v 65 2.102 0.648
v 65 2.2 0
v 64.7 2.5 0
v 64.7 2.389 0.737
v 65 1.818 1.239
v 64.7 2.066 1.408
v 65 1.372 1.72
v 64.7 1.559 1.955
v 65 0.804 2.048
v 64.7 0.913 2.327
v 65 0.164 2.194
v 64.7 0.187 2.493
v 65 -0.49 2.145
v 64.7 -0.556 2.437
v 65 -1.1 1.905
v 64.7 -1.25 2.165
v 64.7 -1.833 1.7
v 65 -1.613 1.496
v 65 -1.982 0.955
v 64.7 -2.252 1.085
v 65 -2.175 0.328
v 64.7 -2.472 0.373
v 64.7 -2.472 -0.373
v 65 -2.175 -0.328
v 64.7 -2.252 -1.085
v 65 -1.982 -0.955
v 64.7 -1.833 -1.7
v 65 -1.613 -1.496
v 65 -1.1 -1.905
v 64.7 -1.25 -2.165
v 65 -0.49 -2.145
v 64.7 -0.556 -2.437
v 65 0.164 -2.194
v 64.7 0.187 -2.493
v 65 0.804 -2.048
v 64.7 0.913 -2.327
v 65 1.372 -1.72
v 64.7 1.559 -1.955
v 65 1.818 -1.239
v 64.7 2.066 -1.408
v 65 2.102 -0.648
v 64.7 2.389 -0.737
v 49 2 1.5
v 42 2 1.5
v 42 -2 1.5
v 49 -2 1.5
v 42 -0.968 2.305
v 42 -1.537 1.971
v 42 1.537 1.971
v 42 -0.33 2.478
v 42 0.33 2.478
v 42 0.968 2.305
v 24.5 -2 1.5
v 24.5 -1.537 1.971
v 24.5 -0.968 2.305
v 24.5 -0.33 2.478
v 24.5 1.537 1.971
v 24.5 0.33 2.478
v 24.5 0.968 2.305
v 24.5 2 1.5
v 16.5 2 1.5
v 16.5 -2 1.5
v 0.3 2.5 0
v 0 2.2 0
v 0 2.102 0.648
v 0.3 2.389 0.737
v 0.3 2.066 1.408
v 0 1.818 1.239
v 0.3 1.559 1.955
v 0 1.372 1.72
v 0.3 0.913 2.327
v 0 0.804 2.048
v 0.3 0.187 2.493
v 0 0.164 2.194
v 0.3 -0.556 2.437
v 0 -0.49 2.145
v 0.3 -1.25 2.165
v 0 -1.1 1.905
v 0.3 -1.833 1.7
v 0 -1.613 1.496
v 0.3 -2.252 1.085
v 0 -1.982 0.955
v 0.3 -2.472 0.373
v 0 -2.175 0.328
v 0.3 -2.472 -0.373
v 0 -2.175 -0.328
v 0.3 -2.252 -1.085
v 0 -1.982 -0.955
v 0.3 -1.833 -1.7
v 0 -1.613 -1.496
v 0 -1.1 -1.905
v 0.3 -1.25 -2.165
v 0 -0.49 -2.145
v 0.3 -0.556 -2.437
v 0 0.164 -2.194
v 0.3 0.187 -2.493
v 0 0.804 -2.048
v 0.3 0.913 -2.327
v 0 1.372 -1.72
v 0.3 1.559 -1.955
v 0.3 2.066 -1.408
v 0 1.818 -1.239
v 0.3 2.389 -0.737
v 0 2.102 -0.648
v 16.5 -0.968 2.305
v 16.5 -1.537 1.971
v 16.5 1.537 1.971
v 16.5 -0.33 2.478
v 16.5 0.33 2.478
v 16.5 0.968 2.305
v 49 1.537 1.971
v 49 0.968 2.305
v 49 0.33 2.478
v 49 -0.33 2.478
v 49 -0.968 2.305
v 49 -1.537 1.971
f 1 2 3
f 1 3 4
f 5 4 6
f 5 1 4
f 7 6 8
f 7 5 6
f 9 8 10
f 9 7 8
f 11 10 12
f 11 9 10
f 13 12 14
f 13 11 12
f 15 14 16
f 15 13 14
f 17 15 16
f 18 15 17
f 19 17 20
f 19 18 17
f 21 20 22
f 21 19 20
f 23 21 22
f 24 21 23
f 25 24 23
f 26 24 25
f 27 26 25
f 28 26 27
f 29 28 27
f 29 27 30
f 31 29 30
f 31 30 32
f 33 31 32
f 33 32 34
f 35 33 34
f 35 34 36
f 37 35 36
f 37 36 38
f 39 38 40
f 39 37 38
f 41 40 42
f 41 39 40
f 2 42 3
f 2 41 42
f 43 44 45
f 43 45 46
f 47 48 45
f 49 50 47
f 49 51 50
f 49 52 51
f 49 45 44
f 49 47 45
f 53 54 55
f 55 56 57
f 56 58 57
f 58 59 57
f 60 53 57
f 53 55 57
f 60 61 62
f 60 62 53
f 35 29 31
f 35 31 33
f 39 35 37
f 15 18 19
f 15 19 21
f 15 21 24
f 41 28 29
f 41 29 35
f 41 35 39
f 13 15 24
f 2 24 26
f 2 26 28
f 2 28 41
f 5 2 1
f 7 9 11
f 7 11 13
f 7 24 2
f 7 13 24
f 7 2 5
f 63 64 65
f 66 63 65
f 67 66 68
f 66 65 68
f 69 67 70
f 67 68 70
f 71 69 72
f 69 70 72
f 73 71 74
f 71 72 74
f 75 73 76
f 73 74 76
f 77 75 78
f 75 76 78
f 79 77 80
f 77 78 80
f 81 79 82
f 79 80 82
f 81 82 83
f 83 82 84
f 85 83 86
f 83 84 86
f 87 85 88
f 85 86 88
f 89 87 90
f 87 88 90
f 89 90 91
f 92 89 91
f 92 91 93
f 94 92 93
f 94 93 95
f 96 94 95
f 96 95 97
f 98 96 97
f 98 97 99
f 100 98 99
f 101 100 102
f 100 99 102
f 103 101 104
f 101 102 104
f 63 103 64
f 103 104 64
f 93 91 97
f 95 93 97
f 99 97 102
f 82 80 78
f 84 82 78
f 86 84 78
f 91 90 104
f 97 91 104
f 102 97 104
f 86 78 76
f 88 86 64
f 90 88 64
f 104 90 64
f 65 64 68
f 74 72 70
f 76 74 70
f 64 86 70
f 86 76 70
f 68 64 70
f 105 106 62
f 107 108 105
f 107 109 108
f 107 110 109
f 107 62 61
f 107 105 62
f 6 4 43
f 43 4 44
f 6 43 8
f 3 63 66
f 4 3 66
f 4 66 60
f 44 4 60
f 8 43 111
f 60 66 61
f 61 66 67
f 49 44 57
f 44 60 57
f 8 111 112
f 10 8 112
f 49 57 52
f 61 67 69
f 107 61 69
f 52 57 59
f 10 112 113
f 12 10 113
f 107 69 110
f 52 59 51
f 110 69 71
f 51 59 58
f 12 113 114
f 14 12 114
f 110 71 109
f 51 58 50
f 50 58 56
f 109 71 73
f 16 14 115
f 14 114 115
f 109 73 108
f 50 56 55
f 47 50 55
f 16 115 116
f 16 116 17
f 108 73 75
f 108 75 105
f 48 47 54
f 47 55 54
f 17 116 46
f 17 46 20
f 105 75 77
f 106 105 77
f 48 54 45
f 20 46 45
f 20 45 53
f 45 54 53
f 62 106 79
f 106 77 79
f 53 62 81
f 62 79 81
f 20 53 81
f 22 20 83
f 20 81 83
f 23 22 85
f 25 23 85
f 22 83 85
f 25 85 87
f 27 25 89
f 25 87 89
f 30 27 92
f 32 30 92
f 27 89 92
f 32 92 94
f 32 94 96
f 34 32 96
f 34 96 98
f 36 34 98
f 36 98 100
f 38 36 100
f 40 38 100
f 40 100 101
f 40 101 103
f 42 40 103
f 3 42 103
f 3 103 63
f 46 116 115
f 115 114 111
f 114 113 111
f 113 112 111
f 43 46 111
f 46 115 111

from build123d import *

# Parameters (mm, degrees)
SKETCH_R      = 2.5
PAD_DEPTH     = 65
SKETCH001_W   = 8
SKETCH001_H   = 6
SKETCH001_W_2 = 7
POCKET_DEPTH  = 1.5
CHAMFER_SIZE  = 0.3


with BuildPart() as part:
    # Sketch → Pad (new body)
    with BuildSketch(Plane.YZ):
        Circle(SKETCH_R)
    extrude(amount=PAD_DEPTH)

    # Sketch001 → Pocket (cut)
    with BuildSketch(Plane.XY.offset(3)):
        with Locations((20.5, 0)):
            Rectangle(SKETCH001_W, SKETCH001_H)
        with Locations((45.5, 0)):
            Rectangle(SKETCH001_W_2, SKETCH001_H)
    extrude(amount=-POCKET_DEPTH, mode=Mode.SUBTRACT)

    # Chamfer
    chamfer_edges = [part.edges().sort_by_distance(p)[0] for p in [
        (0, -2.5, 0),
        (65, -2.5, 0),
    ]]
    chamfer(chamfer_edges, length=CHAMFER_SIZE)


solid = part.part
